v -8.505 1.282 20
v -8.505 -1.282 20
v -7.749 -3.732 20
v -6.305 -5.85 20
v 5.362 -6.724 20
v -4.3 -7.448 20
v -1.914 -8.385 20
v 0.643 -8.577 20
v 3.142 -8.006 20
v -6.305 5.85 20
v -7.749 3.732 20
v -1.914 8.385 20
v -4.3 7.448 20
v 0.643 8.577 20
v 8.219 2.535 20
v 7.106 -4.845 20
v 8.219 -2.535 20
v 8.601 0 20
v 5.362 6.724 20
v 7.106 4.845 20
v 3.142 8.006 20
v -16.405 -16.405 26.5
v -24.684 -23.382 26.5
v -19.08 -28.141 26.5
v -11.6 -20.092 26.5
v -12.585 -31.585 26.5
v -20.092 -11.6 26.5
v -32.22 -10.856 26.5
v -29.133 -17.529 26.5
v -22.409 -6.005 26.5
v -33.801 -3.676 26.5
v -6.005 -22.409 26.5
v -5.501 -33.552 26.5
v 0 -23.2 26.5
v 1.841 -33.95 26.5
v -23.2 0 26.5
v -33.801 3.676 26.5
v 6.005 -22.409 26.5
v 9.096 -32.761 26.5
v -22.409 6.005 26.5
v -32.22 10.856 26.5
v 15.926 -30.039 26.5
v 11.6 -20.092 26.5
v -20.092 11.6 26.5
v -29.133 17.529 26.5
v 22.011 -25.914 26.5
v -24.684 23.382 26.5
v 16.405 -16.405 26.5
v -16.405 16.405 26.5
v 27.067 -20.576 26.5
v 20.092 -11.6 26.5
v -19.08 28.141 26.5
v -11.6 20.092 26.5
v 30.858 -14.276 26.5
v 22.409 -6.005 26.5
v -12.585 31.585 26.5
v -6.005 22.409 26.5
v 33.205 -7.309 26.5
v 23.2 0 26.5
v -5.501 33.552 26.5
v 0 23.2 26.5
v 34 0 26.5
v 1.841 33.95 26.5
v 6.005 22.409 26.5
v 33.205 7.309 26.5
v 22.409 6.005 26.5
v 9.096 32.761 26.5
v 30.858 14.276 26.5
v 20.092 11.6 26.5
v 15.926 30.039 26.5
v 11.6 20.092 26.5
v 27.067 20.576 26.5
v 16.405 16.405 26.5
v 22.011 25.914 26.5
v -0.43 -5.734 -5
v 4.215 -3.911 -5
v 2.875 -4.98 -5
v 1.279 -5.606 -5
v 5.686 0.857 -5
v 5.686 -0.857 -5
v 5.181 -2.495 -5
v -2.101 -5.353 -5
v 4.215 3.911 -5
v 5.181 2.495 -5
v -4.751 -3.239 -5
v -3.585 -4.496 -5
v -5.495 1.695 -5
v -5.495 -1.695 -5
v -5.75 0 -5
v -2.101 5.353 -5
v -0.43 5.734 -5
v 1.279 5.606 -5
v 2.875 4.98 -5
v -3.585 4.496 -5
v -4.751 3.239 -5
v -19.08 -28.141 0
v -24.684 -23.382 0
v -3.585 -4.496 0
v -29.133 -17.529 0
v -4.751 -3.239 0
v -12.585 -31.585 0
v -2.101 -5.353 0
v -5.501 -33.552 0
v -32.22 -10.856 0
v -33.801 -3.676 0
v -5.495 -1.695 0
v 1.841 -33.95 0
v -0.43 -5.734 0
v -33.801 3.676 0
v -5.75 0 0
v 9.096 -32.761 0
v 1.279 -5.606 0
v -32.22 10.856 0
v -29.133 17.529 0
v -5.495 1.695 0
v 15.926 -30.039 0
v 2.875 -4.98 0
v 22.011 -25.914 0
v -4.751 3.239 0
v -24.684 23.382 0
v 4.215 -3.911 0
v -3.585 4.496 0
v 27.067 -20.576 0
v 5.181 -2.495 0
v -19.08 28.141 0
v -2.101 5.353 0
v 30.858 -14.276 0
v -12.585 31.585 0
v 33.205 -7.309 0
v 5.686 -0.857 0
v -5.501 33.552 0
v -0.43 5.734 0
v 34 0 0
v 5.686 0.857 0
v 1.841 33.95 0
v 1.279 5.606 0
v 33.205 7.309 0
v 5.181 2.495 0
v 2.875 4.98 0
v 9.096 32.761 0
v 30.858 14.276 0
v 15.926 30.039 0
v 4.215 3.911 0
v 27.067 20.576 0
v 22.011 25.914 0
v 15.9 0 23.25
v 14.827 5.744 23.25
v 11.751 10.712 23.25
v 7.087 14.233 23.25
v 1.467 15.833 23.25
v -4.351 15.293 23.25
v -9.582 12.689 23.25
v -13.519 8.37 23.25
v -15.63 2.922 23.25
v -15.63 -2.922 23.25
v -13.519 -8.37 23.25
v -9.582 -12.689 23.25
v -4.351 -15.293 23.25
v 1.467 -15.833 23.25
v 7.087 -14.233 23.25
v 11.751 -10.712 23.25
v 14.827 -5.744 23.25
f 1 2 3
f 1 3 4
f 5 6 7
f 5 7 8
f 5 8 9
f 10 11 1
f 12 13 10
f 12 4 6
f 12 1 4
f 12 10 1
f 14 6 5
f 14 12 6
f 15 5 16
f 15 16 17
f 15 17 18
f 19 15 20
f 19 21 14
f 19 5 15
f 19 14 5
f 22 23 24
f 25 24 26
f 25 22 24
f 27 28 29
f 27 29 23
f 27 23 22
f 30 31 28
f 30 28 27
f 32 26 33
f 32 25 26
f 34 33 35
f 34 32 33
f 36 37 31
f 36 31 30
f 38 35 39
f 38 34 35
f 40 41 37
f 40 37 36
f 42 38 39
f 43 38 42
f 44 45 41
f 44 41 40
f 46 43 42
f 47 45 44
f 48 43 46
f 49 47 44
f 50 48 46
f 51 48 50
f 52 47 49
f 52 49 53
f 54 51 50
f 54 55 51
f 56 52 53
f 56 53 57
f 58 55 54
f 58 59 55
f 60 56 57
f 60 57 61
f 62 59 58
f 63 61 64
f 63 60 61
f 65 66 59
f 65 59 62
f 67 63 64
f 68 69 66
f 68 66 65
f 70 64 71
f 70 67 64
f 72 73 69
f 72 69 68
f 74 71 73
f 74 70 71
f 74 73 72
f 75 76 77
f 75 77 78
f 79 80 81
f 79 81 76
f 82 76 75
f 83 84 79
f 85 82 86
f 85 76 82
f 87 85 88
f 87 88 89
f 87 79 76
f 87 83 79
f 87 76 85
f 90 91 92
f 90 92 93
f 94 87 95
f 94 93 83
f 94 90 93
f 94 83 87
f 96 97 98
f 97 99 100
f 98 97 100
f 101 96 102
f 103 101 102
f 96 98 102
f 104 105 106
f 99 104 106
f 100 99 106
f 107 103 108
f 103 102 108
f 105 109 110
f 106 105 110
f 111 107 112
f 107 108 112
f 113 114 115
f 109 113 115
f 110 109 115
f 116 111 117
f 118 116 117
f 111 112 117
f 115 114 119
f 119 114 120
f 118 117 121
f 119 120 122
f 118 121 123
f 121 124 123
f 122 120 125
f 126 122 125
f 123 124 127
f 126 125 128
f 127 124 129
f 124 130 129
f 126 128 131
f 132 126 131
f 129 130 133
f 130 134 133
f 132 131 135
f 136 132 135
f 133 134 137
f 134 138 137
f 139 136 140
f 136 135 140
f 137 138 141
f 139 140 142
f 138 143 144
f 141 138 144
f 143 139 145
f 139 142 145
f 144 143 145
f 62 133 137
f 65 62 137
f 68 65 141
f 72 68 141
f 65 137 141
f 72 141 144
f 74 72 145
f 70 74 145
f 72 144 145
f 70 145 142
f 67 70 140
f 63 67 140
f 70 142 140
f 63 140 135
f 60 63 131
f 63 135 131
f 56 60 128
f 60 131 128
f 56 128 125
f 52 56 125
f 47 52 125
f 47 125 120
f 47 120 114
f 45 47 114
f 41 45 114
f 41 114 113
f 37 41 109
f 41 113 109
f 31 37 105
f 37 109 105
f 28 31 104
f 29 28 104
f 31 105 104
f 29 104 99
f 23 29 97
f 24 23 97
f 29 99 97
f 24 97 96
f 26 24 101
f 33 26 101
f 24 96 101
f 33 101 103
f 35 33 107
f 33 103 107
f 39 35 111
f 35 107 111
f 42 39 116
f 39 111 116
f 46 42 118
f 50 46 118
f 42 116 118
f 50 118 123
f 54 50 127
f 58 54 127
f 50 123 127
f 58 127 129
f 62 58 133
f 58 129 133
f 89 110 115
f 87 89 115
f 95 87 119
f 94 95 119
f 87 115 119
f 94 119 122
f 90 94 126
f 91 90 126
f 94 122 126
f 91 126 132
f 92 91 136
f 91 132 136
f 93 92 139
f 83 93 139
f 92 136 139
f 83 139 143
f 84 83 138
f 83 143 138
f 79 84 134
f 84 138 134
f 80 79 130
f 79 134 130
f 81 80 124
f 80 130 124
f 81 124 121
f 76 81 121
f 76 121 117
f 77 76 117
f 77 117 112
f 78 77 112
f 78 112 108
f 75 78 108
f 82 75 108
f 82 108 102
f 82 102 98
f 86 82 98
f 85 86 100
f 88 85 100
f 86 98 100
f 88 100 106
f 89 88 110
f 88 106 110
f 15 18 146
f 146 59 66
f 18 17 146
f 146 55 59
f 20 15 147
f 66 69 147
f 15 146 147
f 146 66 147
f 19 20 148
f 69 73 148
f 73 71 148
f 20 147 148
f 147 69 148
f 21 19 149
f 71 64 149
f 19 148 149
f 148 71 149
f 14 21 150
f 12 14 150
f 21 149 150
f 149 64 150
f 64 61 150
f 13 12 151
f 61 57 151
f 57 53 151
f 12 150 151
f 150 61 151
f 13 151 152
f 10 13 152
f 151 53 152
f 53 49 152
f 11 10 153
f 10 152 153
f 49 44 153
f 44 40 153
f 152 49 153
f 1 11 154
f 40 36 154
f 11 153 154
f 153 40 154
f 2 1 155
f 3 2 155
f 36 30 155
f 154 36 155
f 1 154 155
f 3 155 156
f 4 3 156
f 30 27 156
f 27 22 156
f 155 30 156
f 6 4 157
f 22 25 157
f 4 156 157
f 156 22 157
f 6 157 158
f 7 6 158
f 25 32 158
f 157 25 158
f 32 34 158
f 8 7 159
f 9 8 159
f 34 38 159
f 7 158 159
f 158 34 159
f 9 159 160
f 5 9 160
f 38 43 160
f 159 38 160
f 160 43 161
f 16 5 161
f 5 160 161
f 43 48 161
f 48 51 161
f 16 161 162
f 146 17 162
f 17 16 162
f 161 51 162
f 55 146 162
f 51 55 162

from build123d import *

# Parameters (mm, degrees)
SKETCH1_R           = 34
BOSS_EXTRUDE1_DEPTH = 26.5
SKETCH2_R           = 23.2
CUT_EXTRUDE1_DEPTH  = 6.5
CUT_EXTRUDE1_DRAFT  = -66
SKETCH3_R           = 5.75
BOSS_EXTRUDE2_DEPTH = 5


with BuildPart() as part:
    # Sketch1 → Boss-Extrude1 (new body)
    with BuildSketch(Plane.XY):
        Circle(SKETCH1_R)
    extrude(amount=BOSS_EXTRUDE1_DEPTH)


with BuildPart() as cut_extrude1_tool:
    # Sketch2 → Cut-Extrude1 (with draft: the straight prism first)
    with BuildSketch(Plane.XY.offset(26.5)):
        Circle(SKETCH2_R)
    extrude(amount=-CUT_EXTRUDE1_DEPTH)
    # Cut-Extrude1: the draft: its side faces are tilted about the plane it starts from
    cut_extrude1_sides = [cut_extrude1_tool.faces().sort_by_distance(p)[0] for p in [
        (-23.2, 0, 23.25),
    ]]
    draft(cut_extrude1_sides, Plane.XY.offset(26.5), CUT_EXTRUDE1_DRAFT)


with BuildPart() as part_1:
    add(part.part)

    # Cut-Extrude1: cut by cut_extrude1_tool
    add(cut_extrude1_tool.part, mode=Mode.SUBTRACT)

    # Sketch3 → Boss-Extrude2 (add)
    with BuildSketch(Plane(origin=(0, 0, 0), x_dir=(-1, 0, 0), z_dir=(0, 0, -1))):
        Circle(SKETCH3_R)
    extrude(amount=BOSS_EXTRUDE2_DEPTH)


solid = part_1.part
